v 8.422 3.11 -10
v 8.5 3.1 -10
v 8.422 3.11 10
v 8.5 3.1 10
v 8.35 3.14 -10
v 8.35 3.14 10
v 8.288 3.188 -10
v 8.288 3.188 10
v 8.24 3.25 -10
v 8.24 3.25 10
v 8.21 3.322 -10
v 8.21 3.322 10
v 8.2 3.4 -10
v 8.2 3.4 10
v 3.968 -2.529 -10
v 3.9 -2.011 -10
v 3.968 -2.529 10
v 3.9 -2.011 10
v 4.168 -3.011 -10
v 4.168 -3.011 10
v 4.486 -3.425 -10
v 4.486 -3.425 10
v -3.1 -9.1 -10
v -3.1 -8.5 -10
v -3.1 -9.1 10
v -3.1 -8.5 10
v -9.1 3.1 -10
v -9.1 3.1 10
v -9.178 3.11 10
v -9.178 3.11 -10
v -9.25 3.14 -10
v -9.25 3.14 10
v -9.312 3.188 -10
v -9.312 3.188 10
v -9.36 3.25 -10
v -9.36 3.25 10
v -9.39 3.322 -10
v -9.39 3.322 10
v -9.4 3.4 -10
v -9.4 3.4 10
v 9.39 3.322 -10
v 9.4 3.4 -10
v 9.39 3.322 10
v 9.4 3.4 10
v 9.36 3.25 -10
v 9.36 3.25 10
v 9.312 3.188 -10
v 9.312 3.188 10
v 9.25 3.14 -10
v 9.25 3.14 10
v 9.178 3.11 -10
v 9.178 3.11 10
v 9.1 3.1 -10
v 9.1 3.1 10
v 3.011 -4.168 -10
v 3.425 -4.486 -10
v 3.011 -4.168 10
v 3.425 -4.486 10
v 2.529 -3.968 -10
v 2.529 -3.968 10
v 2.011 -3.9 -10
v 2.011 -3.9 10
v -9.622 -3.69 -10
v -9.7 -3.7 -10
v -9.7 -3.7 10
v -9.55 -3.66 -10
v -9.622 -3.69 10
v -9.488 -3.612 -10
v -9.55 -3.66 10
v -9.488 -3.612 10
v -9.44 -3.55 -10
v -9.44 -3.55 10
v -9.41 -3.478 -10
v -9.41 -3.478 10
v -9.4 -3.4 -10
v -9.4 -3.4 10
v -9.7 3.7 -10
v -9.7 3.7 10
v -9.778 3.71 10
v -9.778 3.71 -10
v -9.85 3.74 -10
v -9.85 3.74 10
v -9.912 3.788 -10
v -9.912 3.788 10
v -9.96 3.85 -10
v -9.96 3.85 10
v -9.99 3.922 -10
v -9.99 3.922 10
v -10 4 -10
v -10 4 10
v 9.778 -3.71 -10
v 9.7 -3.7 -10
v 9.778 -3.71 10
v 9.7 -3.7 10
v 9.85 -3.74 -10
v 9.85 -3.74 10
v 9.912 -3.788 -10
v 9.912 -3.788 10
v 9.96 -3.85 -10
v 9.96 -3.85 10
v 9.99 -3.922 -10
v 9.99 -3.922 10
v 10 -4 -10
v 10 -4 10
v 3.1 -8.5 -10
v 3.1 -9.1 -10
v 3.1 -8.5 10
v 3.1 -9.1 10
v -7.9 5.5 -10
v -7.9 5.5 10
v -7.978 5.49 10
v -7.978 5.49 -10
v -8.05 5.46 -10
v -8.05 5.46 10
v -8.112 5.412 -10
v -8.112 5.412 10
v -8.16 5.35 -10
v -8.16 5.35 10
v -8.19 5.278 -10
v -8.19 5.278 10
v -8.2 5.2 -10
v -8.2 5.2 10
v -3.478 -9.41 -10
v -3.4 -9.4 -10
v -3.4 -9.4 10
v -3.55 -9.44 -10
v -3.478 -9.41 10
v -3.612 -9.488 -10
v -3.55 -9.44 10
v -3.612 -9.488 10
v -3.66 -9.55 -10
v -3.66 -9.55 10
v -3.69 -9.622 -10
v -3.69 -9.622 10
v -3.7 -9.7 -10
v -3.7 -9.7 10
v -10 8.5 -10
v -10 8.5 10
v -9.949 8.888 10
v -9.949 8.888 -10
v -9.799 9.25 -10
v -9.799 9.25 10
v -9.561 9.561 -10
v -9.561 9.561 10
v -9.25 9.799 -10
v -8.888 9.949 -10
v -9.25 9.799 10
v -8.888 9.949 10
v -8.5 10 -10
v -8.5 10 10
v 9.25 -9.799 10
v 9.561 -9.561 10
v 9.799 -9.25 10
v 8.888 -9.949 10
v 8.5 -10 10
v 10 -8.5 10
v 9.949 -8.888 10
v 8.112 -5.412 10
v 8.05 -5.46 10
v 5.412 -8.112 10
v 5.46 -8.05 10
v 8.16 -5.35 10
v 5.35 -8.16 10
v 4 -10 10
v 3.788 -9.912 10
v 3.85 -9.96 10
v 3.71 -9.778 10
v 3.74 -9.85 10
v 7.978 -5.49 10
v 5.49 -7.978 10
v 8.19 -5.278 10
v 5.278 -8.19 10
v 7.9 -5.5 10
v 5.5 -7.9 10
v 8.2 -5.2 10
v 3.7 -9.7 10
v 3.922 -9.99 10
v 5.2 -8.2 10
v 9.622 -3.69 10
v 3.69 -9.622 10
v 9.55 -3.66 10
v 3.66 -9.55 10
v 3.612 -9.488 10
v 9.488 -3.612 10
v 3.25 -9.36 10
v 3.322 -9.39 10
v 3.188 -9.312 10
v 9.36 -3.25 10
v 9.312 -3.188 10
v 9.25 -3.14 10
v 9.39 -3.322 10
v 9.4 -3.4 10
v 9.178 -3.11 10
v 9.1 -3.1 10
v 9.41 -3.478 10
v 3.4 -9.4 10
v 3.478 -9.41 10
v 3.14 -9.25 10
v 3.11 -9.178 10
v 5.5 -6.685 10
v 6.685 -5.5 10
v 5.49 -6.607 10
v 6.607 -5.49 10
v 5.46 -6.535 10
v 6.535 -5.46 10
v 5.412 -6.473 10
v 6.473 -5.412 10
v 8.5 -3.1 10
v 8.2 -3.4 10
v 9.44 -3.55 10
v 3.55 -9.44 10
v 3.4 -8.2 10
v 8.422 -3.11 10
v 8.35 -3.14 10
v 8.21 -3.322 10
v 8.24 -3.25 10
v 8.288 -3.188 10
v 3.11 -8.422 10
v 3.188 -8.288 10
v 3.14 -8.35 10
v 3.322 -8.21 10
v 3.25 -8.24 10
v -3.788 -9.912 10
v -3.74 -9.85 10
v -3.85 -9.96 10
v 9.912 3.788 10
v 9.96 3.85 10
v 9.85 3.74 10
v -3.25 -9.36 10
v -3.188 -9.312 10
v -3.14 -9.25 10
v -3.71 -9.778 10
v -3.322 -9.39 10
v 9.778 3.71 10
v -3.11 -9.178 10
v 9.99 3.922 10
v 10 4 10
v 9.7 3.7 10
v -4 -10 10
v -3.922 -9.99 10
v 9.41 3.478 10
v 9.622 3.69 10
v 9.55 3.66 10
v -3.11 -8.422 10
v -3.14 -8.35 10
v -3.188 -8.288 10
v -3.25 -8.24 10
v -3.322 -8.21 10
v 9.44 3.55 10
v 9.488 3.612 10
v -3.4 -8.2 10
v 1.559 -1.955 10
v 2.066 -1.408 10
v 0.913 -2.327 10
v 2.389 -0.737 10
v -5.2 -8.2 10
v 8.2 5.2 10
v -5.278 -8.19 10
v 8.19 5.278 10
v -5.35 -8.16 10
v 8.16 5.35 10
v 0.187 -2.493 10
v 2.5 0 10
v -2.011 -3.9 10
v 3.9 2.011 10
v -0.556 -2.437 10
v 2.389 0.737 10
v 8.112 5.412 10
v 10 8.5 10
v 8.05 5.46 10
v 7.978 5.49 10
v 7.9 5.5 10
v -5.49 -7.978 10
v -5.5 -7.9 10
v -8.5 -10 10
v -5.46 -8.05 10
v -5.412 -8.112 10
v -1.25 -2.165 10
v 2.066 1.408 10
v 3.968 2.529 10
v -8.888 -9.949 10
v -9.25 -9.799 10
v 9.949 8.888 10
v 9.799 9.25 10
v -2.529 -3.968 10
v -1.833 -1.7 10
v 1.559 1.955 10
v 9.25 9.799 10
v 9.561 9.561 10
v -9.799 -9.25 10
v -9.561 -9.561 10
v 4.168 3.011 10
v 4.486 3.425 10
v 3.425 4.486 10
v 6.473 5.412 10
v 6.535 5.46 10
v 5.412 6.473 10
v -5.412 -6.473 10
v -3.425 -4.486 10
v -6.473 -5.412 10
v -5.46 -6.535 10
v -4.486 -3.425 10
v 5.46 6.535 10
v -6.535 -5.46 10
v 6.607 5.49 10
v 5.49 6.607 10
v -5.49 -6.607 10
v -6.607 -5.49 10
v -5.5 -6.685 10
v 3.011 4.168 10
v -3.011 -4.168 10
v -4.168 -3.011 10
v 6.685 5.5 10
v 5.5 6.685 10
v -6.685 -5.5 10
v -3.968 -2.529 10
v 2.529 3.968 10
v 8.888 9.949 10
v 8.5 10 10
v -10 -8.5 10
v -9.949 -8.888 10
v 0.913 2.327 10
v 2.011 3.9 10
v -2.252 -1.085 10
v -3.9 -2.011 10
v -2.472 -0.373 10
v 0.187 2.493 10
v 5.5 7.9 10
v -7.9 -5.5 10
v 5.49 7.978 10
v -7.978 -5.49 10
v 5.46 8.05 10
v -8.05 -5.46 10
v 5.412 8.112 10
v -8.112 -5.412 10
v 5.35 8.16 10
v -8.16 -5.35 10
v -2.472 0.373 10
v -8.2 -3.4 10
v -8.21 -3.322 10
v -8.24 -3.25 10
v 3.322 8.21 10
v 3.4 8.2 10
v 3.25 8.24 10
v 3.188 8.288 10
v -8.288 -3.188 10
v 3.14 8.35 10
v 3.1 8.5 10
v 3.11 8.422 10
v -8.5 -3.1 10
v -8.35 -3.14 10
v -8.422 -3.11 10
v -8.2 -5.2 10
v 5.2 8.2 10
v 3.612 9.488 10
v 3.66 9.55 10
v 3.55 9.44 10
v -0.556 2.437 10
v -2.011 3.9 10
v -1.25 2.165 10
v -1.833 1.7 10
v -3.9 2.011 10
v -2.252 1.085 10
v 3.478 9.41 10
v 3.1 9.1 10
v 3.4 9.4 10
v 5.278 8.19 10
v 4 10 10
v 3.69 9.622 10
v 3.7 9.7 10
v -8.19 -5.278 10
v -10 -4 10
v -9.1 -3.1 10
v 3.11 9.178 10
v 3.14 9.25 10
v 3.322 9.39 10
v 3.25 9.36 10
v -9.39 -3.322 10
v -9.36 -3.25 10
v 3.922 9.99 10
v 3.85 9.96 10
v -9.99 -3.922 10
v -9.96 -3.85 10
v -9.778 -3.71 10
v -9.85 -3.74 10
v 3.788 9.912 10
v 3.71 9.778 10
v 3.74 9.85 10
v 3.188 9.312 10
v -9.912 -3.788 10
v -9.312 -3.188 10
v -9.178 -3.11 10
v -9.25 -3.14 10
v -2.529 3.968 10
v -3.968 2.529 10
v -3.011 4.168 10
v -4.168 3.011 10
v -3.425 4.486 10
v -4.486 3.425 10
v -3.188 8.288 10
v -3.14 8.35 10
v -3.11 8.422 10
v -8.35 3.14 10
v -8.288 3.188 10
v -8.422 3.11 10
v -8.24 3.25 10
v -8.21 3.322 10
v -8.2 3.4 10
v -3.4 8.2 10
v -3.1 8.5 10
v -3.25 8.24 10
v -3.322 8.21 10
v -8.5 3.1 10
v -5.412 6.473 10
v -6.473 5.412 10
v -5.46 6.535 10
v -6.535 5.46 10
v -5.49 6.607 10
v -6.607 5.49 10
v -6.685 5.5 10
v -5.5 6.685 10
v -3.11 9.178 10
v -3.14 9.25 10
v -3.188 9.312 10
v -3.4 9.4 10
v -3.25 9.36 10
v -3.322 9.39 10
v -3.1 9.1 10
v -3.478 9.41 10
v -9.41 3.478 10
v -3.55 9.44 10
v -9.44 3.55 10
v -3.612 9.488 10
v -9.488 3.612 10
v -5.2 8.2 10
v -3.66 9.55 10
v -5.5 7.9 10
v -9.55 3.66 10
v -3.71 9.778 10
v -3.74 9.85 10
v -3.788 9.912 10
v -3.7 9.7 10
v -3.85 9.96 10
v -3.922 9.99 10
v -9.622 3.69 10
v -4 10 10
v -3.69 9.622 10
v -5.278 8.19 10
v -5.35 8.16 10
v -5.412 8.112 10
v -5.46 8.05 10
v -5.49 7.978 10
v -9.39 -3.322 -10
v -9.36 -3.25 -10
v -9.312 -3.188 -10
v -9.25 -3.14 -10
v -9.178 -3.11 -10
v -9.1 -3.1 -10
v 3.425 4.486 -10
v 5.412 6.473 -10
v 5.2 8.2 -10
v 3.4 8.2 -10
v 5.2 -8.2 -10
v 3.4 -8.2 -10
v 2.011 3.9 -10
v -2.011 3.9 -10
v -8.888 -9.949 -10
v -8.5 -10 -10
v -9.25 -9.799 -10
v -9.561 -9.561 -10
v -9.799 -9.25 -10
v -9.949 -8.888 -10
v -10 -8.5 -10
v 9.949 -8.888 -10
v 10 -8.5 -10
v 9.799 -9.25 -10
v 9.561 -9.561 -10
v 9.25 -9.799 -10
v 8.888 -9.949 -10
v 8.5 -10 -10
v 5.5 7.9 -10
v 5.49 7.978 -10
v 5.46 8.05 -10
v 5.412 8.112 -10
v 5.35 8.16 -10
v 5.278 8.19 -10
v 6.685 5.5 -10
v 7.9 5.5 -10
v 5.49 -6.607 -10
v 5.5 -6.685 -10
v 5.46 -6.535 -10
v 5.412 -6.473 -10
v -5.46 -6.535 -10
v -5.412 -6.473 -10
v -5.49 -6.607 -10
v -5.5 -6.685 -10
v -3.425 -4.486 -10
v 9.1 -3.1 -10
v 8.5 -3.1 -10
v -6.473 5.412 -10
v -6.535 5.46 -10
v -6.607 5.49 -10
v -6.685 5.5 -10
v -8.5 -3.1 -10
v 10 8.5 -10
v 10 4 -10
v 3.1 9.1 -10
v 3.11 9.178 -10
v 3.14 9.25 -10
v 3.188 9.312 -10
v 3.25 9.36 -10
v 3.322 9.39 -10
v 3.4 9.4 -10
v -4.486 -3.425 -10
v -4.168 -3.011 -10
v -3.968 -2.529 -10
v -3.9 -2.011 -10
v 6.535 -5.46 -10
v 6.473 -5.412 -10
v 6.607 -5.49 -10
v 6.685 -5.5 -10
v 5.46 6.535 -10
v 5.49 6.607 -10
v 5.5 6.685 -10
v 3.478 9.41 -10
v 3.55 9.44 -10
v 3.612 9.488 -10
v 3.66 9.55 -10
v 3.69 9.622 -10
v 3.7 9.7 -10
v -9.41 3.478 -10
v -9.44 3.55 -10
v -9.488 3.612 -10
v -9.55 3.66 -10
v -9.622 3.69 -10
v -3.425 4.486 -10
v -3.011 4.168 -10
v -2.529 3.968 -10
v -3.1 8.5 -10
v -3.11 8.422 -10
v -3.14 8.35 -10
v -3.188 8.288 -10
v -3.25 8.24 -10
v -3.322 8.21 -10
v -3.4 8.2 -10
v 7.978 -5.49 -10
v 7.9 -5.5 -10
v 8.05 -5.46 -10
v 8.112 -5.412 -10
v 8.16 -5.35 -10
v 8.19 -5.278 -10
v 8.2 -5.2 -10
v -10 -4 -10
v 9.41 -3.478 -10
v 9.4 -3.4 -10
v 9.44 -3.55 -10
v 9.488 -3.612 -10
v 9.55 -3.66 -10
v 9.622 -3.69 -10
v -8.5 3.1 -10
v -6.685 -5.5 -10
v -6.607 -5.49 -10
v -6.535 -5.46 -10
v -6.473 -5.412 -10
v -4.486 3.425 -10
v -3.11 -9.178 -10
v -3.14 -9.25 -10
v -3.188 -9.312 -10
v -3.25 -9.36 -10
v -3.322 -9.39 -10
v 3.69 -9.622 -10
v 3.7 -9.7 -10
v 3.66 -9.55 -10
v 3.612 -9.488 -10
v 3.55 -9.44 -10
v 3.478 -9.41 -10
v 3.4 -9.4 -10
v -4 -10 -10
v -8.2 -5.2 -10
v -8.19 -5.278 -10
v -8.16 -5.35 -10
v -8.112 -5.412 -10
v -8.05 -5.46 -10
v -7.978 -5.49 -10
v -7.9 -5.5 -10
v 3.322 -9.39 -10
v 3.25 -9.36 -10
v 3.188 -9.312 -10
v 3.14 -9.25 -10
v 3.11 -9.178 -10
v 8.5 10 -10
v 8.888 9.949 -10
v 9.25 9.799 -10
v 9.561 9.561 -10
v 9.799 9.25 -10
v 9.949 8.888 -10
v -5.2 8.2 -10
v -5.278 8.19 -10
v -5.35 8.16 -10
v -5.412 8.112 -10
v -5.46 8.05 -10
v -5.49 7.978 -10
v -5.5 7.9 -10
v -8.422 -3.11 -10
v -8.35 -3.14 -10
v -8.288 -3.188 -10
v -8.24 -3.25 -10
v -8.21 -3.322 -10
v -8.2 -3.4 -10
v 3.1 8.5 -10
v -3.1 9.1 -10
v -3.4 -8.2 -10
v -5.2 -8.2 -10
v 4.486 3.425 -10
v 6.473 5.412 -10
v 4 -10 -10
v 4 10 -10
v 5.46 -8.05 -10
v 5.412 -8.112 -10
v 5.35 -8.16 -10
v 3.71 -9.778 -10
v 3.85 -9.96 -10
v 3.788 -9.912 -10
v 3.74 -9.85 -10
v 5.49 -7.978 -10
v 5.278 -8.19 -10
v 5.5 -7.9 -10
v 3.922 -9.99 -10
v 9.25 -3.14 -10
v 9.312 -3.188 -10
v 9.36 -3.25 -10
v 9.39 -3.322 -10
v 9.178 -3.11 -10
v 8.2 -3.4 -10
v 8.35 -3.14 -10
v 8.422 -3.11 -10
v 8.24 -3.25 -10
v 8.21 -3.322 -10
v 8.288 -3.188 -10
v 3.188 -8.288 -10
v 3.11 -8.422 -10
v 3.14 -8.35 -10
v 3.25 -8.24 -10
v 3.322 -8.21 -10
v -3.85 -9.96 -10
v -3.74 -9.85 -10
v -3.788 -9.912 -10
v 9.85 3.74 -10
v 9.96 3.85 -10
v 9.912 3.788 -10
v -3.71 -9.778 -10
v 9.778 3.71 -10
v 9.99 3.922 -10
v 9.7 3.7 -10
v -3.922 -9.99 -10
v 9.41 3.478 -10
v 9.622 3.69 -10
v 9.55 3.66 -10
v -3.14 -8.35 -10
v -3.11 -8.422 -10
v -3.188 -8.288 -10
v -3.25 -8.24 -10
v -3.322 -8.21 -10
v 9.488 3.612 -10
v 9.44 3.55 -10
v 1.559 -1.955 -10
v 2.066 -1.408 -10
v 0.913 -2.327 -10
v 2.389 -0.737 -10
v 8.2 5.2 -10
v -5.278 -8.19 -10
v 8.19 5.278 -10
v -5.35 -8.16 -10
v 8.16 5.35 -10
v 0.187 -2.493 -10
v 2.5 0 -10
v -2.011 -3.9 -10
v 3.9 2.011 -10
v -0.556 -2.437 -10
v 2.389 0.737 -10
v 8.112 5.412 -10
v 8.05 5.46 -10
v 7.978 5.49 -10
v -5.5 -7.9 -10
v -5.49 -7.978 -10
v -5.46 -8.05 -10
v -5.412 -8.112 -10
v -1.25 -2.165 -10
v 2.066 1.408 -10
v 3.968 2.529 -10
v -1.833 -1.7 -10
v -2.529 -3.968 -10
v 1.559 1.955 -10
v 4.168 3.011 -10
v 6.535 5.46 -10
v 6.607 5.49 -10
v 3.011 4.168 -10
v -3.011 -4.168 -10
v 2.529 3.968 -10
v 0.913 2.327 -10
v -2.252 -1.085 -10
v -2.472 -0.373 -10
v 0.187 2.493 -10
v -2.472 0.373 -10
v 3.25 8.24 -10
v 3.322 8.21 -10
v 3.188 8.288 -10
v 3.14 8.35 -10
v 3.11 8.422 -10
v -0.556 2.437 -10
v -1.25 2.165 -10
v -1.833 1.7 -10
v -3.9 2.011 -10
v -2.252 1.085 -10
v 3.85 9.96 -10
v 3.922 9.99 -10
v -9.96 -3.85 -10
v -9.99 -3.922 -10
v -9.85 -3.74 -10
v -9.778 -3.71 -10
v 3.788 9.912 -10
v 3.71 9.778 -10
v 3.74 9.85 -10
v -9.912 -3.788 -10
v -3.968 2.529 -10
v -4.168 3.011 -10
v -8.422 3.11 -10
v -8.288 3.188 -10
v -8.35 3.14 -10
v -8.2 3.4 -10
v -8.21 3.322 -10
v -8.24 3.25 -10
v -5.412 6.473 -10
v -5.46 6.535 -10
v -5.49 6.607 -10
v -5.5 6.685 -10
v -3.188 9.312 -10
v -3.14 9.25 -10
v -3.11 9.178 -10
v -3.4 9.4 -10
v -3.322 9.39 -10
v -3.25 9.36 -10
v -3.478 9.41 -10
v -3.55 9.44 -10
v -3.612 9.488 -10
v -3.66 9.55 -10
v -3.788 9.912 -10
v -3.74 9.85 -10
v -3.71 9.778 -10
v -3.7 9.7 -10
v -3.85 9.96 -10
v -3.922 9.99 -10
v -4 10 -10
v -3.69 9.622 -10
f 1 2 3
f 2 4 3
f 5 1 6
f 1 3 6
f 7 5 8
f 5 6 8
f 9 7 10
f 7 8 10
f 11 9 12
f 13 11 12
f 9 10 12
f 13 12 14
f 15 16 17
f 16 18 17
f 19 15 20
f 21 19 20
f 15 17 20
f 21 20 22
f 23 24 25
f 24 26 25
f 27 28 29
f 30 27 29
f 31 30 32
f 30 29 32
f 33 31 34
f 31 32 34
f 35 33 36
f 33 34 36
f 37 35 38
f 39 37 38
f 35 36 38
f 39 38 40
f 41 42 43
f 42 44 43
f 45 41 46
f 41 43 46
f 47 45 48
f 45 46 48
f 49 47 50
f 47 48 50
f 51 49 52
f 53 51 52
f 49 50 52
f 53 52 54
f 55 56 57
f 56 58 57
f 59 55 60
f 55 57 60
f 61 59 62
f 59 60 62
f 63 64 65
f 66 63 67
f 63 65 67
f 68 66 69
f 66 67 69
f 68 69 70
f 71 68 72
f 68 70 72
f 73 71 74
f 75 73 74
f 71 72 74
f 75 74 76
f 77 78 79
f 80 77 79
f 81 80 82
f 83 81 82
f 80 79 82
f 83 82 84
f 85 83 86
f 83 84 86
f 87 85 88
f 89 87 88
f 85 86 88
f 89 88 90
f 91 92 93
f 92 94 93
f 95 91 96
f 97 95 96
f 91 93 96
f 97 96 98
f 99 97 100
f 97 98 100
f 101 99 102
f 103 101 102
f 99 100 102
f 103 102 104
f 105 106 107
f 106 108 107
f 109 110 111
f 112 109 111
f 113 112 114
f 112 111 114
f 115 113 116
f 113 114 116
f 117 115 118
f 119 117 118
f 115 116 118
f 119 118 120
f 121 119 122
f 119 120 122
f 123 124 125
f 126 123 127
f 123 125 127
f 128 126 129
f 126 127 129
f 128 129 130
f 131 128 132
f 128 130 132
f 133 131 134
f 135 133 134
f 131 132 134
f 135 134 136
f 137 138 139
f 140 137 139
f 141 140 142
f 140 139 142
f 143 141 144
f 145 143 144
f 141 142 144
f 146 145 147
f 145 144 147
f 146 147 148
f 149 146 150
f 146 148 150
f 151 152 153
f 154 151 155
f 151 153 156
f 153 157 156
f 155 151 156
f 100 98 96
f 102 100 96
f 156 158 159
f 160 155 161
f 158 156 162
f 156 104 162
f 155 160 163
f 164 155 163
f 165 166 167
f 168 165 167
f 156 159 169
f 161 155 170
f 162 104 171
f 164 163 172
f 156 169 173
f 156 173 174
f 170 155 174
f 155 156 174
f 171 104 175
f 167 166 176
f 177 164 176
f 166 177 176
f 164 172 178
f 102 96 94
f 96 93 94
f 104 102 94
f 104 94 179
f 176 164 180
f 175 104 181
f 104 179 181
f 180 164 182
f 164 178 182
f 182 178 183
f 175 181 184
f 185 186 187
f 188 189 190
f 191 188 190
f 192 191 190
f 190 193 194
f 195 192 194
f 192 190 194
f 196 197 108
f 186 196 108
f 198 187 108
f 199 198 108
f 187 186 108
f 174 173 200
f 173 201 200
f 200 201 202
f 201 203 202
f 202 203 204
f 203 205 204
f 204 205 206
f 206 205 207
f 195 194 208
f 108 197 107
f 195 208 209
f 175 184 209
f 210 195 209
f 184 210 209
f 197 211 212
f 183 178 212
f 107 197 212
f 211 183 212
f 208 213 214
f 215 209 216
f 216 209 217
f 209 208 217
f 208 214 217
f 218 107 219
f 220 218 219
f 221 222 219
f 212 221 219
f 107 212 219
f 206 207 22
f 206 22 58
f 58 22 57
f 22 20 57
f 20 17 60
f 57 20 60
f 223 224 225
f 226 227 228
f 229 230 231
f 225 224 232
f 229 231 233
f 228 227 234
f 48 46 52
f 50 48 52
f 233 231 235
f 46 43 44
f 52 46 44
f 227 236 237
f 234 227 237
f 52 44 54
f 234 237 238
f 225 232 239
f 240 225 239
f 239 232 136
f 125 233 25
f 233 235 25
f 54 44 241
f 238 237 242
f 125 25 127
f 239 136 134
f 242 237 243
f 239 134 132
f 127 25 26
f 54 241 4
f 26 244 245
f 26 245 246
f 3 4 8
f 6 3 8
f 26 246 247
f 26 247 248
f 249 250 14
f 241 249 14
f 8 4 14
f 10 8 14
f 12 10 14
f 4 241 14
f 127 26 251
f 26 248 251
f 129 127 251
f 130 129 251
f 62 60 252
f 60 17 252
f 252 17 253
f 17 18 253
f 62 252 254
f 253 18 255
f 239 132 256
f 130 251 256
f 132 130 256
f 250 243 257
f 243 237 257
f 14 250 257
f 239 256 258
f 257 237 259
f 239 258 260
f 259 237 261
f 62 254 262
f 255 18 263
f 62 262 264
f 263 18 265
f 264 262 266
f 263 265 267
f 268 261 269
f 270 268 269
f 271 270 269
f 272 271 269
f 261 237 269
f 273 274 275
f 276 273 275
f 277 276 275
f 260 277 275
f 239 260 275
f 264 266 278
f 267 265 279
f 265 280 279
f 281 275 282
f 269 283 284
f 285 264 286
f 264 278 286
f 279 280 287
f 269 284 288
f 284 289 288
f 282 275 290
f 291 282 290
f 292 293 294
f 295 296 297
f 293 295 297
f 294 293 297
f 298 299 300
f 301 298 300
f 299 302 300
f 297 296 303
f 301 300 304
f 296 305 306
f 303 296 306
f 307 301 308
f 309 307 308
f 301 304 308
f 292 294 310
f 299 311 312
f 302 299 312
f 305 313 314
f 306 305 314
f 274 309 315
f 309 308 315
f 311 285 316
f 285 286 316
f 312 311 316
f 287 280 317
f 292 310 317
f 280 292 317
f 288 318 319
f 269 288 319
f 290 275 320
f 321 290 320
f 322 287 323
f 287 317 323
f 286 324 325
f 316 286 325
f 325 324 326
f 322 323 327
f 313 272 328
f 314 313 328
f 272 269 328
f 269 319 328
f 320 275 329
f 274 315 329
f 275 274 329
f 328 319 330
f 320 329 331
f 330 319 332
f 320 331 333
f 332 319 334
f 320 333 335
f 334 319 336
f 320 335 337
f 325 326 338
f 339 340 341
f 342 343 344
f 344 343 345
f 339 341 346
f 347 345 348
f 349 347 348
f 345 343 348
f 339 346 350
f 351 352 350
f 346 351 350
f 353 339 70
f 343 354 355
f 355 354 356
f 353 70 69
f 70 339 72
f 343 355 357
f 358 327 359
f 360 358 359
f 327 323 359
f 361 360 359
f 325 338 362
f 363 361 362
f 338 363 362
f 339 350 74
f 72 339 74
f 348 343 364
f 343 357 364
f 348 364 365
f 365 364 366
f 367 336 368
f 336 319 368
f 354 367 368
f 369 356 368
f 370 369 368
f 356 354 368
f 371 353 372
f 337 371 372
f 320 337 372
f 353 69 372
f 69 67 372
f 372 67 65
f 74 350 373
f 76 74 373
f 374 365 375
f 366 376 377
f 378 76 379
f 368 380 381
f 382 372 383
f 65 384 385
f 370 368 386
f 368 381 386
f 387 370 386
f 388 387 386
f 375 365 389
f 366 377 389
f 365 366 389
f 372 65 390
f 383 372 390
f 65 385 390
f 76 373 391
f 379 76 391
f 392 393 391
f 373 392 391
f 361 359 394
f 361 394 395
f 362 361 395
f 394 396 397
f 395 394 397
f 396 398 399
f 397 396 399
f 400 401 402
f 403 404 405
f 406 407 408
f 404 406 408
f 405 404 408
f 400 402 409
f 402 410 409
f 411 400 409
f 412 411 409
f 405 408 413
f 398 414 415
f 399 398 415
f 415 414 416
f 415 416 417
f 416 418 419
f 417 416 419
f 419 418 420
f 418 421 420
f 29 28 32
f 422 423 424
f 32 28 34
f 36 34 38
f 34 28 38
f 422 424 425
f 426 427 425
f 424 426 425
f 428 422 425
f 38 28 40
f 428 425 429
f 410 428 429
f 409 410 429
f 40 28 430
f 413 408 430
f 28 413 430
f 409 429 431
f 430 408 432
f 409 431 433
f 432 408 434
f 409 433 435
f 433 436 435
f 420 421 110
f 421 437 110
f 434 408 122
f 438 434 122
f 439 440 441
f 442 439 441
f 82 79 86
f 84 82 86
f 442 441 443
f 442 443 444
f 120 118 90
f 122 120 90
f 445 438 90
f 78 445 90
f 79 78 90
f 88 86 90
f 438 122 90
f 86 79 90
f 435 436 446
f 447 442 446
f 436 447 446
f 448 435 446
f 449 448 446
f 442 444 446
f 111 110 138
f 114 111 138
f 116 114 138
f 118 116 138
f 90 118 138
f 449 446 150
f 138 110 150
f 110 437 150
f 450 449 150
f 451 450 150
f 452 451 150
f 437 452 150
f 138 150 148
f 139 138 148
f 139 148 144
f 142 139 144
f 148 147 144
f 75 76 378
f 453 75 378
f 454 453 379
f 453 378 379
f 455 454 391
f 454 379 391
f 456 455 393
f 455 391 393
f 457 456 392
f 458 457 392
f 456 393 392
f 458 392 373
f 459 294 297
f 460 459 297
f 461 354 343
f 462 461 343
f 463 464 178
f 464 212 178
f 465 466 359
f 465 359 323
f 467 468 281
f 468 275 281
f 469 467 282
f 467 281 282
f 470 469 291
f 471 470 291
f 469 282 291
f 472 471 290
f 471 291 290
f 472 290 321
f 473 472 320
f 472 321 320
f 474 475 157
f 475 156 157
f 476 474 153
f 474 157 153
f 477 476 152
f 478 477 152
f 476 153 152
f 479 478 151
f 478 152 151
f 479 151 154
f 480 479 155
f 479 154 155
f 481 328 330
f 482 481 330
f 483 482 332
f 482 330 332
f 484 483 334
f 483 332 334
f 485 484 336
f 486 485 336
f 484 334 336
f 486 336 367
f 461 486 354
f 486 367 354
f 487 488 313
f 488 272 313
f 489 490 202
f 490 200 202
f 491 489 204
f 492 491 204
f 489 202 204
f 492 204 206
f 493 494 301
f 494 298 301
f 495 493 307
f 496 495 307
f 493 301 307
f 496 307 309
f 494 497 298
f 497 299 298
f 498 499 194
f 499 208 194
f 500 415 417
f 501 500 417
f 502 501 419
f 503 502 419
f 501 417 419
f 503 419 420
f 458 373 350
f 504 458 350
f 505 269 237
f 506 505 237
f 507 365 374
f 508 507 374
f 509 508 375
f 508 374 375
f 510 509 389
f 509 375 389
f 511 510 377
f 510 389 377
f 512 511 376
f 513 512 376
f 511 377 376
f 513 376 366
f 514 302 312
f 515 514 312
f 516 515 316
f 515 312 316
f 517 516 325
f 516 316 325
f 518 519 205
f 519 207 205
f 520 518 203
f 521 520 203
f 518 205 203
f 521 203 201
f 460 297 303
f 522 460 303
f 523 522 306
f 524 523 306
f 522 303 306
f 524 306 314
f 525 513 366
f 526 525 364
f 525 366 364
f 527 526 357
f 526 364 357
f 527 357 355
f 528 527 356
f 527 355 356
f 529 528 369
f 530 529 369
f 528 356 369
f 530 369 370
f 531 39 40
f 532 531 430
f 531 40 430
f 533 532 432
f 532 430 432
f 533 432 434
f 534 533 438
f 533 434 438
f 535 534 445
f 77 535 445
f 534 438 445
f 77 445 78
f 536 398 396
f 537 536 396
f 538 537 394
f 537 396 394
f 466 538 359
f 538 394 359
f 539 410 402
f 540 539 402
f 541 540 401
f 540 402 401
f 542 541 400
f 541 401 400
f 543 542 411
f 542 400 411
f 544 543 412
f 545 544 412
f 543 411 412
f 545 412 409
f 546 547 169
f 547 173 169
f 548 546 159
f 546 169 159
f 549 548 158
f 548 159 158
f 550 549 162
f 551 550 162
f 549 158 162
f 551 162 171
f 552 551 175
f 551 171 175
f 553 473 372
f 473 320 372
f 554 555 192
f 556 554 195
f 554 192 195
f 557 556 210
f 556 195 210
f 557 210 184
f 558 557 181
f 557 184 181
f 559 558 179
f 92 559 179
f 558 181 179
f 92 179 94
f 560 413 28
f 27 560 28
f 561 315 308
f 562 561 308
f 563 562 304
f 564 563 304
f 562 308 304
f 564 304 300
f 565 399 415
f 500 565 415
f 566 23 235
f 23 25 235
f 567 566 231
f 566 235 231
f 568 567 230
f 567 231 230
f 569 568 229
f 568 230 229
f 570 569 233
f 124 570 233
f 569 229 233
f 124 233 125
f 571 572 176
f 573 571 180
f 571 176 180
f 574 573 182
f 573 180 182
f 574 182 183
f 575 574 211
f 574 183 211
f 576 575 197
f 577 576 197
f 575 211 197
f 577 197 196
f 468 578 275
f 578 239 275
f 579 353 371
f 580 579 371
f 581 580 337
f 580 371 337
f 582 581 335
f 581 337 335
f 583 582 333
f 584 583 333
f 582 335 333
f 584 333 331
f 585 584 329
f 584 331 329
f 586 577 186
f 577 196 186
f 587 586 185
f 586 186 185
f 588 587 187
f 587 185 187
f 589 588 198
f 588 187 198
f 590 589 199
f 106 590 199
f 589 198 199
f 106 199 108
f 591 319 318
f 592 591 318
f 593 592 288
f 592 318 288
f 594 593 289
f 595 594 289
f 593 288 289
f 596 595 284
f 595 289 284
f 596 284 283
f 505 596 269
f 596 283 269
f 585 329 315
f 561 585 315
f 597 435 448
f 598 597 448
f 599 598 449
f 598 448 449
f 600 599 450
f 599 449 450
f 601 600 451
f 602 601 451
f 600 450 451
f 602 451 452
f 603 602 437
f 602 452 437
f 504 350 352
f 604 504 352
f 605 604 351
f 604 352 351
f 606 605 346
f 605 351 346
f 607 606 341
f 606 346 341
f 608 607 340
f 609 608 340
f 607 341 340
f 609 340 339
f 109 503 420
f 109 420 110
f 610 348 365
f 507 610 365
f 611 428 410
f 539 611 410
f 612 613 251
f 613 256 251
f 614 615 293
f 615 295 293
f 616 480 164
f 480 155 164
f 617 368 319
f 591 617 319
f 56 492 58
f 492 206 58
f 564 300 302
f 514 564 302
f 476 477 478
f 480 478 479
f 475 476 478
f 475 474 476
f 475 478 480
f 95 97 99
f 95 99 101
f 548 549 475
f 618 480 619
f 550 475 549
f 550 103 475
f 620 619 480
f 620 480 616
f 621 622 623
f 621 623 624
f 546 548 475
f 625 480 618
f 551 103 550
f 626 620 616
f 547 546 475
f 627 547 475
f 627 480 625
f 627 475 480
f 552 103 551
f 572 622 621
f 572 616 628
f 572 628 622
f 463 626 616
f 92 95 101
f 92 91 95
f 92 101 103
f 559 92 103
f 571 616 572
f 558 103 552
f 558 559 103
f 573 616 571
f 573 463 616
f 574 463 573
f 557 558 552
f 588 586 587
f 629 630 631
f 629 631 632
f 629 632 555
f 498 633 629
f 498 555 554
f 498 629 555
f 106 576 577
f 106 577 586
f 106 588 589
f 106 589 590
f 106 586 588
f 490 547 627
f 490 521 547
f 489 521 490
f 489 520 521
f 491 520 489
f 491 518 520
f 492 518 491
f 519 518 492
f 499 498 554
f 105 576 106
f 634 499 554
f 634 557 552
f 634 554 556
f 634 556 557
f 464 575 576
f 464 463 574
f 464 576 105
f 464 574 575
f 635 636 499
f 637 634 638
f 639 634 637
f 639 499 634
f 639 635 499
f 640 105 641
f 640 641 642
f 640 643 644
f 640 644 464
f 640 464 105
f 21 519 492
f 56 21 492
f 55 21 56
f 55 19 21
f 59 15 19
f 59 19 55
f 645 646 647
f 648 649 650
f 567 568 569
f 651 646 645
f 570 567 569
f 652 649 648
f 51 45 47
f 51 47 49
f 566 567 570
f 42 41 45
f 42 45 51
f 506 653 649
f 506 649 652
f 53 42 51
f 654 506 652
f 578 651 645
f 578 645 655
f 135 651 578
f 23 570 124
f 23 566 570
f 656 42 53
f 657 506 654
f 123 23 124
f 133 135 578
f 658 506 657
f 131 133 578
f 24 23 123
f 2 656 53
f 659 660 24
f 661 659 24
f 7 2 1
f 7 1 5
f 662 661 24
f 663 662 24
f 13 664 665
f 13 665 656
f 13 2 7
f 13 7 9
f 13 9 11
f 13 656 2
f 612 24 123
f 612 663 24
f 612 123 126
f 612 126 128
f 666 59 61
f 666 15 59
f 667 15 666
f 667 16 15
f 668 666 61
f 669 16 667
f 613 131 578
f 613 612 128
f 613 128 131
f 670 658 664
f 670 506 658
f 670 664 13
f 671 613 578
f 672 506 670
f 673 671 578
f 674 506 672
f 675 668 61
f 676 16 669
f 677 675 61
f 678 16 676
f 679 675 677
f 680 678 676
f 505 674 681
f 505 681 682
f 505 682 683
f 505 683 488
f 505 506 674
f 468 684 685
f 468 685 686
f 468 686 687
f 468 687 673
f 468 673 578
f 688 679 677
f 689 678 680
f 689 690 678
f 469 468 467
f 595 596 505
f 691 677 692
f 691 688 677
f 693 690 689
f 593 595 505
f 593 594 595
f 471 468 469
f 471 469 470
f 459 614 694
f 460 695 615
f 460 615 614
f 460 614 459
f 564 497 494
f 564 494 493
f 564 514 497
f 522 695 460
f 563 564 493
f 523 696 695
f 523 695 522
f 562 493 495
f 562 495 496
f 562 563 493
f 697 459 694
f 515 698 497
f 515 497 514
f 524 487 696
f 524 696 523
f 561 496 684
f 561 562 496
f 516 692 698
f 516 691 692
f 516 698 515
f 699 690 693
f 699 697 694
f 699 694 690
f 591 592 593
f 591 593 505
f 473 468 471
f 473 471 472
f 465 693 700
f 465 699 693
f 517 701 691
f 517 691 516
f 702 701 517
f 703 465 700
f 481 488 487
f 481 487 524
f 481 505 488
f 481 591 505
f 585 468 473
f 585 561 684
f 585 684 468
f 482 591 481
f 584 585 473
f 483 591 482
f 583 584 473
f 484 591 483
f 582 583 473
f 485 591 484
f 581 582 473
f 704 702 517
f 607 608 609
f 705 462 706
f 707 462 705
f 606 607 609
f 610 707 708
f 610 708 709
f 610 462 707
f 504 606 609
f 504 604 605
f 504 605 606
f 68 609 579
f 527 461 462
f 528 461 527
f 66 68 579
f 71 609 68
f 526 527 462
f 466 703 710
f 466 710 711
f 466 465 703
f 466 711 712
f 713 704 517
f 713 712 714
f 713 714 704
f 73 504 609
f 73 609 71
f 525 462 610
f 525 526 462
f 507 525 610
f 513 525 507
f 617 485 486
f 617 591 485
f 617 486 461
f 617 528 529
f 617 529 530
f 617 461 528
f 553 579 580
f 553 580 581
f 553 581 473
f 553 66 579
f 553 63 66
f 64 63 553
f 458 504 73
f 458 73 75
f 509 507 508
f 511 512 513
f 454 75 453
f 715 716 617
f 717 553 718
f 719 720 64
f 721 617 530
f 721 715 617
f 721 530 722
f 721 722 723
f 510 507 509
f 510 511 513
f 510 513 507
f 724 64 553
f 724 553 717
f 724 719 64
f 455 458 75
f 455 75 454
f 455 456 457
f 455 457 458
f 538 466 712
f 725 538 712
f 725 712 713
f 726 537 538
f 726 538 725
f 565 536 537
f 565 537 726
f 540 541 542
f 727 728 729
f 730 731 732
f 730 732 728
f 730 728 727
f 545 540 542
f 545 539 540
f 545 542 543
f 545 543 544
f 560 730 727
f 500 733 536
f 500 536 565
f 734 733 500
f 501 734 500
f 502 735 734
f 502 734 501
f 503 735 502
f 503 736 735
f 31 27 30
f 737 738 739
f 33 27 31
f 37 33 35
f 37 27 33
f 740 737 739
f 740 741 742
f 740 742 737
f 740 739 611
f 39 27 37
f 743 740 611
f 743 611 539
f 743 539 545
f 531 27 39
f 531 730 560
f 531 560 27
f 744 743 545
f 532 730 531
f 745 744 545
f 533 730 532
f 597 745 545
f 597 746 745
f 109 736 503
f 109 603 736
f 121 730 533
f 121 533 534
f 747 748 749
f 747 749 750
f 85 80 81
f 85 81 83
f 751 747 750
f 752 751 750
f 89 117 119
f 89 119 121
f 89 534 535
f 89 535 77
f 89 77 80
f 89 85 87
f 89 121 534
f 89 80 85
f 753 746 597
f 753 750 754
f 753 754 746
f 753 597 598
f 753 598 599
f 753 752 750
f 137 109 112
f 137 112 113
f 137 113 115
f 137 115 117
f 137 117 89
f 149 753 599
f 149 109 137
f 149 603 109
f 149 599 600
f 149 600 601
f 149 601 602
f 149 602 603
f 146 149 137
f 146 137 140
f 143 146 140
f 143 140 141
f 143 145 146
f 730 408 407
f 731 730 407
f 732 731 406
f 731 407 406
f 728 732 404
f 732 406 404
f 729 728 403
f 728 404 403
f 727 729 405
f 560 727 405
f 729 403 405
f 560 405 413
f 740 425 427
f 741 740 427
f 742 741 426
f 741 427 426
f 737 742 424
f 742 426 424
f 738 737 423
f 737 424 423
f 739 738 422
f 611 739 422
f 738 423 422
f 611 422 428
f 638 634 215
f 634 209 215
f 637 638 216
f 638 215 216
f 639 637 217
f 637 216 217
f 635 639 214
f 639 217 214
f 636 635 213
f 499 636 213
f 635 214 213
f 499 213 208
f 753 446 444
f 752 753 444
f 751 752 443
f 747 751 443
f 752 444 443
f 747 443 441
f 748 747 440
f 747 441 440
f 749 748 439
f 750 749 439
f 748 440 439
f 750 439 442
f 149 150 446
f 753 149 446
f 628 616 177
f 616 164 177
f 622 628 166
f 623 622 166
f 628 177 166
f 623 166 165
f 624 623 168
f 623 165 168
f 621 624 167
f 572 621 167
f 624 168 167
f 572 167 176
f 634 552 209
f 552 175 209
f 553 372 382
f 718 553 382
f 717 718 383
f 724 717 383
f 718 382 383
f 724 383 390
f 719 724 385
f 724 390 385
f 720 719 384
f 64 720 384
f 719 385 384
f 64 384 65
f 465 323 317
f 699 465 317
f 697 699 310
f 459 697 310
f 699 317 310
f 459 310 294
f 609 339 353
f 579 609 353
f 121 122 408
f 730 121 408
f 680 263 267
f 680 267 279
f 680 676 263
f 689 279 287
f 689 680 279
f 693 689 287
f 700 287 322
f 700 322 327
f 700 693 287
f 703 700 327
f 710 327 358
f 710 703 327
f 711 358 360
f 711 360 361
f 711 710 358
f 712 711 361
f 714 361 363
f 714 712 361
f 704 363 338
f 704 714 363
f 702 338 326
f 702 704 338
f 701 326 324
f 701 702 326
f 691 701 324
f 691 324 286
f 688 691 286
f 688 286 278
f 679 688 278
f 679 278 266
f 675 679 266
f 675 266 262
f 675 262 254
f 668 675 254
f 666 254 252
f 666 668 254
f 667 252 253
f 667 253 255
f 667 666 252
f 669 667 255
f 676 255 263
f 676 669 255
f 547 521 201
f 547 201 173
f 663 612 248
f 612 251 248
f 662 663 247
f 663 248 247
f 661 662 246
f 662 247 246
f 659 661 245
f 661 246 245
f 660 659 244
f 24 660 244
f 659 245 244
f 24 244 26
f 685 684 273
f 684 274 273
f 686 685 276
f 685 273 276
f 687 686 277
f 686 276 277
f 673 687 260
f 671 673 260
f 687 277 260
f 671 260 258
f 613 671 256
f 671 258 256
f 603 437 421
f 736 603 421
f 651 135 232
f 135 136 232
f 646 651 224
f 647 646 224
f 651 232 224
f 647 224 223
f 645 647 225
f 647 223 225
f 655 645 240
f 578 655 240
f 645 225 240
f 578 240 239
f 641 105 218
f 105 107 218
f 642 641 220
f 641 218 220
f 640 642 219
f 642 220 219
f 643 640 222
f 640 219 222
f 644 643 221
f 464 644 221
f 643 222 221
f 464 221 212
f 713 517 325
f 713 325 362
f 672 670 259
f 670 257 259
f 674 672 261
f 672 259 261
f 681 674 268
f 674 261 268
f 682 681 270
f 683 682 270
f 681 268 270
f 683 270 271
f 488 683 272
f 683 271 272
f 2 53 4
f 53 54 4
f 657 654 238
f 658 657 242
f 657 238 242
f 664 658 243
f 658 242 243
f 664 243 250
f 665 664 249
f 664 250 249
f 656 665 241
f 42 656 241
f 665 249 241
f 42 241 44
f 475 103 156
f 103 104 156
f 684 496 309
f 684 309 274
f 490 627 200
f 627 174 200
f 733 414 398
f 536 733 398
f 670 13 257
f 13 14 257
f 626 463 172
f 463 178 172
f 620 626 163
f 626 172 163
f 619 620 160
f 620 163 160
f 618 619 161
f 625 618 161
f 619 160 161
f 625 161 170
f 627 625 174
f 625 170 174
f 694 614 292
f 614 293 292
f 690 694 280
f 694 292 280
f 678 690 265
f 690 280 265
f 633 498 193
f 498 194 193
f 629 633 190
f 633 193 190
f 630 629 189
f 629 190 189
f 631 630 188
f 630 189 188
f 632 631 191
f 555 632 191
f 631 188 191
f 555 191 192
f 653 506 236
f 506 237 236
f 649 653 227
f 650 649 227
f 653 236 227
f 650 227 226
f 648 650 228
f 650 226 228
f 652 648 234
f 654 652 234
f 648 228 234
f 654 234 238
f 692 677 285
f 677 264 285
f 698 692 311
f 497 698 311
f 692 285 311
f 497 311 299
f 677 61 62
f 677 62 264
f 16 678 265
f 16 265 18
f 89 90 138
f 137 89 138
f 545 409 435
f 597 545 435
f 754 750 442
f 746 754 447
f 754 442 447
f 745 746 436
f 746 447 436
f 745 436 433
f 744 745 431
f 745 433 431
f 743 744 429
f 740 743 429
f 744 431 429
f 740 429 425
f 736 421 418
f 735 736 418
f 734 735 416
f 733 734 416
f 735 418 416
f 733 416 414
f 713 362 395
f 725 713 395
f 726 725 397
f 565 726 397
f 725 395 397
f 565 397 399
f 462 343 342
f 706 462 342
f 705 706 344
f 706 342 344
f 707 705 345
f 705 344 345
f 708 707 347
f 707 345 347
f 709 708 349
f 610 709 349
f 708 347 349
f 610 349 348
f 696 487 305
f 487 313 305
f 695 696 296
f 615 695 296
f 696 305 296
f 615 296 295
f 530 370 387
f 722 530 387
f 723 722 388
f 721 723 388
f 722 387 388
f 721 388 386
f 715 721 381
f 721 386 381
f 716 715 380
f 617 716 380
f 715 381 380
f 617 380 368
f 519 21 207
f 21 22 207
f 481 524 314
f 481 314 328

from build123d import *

# Parameters (mm, degrees)
SKETCH_1_R      = 2.5
EXTRUDE_1_DEPTH = 10


with BuildPart() as part:
    # 草图1 → 凸台-拉伸1 (new, symmetric)
    with BuildSketch(Plane.XY):
        with BuildLine():
            Line((10, 8.5), (10, 4))
            ThreePointArc((10, 4), (9.912132034, 3.787867966), (9.7, 3.7))
            ThreePointArc((9.7, 3.7), (9.487867966, 3.612132034), (9.4, 3.4))
            ThreePointArc((9.4, 3.4), (9.312132034, 3.187867966), (9.1, 3.1))
            Line((9.1, 3.1), (8.5, 3.1))
            ThreePointArc((8.5, 3.1), (8.287867966, 3.187867966), (8.2, 3.4))
            Line((8.2, 3.4), (8.2, 5.2))
            ThreePointArc((8.2, 5.2), (8.112132034, 5.412132034), (7.9, 5.5))
            Line((7.9, 5.5), (6.68492424, 5.5))
            ThreePointArc((6.68492424, 5.5), (6.570119211, 5.47716386), (6.472792206, 5.412132034))
            Line((6.472792206, 5.412132034), (4.485786438, 3.425126266))
            ThreePointArc((4.485786438, 3.425126266), (4.052240935, 2.776279568), (3.9, 2.010912703))
            Line((3.9, 2.010912703), (3.9, -2.010912703))
            ThreePointArc((3.9, -2.010912703), (4.052240935, -2.776279568), (4.485786438, -3.425126266))
            Line((4.485786438, -3.425126266), (6.472792206, -5.412132034))
            ThreePointArc((6.472792206, -5.412132034), (6.570119211, -5.47716386), (6.68492424, -5.5))
            Line((6.68492424, -5.5), (7.9, -5.5))
            ThreePointArc((7.9, -5.5), (8.112132034, -5.412132034), (8.2, -5.2))
            Line((8.2, -5.2), (8.2, -3.4))
            ThreePointArc((8.2, -3.4), (8.287867966, -3.187867966), (8.5, -3.1))
            Line((8.5, -3.1), (9.1, -3.1))
            ThreePointArc((9.1, -3.1), (9.312132034, -3.187867966), (9.4, -3.4))
            ThreePointArc((9.4, -3.4), (9.487867966, -3.612132034), (9.7, -3.7))
            ThreePointArc((9.7, -3.7), (9.912132034, -3.787867966), (10, -4))
            Line((10, -4), (10, -8.5))
            ThreePointArc((10, -8.5), (9.560660172, -9.560660172), (8.5, -10))
            Line((8.5, -10), (4, -10))
            ThreePointArc((4, -10), (3.787867966, -9.912132034), (3.7, -9.7))
            ThreePointArc((3.7, -9.7), (3.612132034, -9.487867966), (3.4, -9.4))
            ThreePointArc((3.4, -9.4), (3.187867966, -9.312132034), (3.1, -9.1))
            Line((3.1, -9.1), (3.1, -8.5))
            ThreePointArc((3.1, -8.5), (3.187867966, -8.287867966), (3.4, -8.2))
            Line((3.4, -8.2), (5.2, -8.2))
            ThreePointArc((5.2, -8.2), (5.412132034, -8.112132034), (5.5, -7.9))
            Line((5.5, -7.9), (5.5, -6.68492424))
            ThreePointArc((5.5, -6.68492424), (5.47716386, -6.570119211), (5.412132034, -6.472792206))
            Line((5.412132034, -6.472792206), (3.425126266, -4.485786438))
            ThreePointArc((3.425126266, -4.485786438), (2.776279568, -4.052240935), (2.010912703, -3.9))
            Line((2.010912703, -3.9), (-2.010912703, -3.9))
            ThreePointArc((-2.010912703, -3.9), (-2.776279568, -4.052240935), (-3.425126266, -4.485786438))
            Line((-3.425126266, -4.485786438), (-5.412132034, -6.472792206))
            ThreePointArc((-5.412132034, -6.472792206), (-5.47716386, -6.570119211), (-5.5, -6.68492424))
            Line((-5.5, -6.68492424), (-5.5, -7.9))
            ThreePointArc((-5.5, -7.9), (-5.412132034, -8.112132034), (-5.2, -8.2))
            Line((-5.2, -8.2), (-3.4, -8.2))
            ThreePointArc((-3.4, -8.2), (-3.187867966, -8.287867966), (-3.1, -8.5))
            Line((-3.1, -8.5), (-3.1, -9.1))
            ThreePointArc((-3.1, -9.1), (-3.187867966, -9.312132034), (-3.4, -9.4))
            ThreePointArc((-3.4, -9.4), (-3.612132034, -9.487867966), (-3.7, -9.7))
            ThreePointArc((-3.7, -9.7), (-3.787867966, -9.912132034), (-4, -10))
            Line((-4, -10), (-8.5, -10))
            ThreePointArc((-8.5, -10), (-9.560660172, -9.560660172), (-10, -8.5))
            Line((-10, -8.5), (-10, -4))
            ThreePointArc((-10, -4), (-9.912132034, -3.787867966), (-9.7, -3.7))
            ThreePointArc((-9.7, -3.7), (-9.487867966, -3.612132034), (-9.4, -3.4))
            ThreePointArc((-9.4, -3.4), (-9.312132034, -3.187867966), (-9.1, -3.1))
            Line((-9.1, -3.1), (-8.5, -3.1))
            ThreePointArc((-8.5, -3.1), (-8.287867966, -3.187867966), (-8.2, -3.4))
            Line((-8.2, -3.4), (-8.2, -5.2))
            ThreePointArc((-8.2, -5.2), (-8.112132034, -5.412132034), (-7.9, -5.5))
            Line((-7.9, -5.5), (-6.68492424, -5.5))
            ThreePointArc((-6.68492424, -5.5), (-6.570119211, -5.47716386), (-6.472792206, -5.412132034))
            Line((-6.472792206, -5.412132034), (-4.485786438, -3.425126266))
            ThreePointArc((-4.485786438, -3.425126266), (-4.052240935, -2.776279568), (-3.9, -2.010912703))
            Line((-3.9, -2.010912703), (-3.9, 2.010912703))
            ThreePointArc((-3.9, 2.010912703), (-4.052240935, 2.776279568), (-4.485786438, 3.425126266))
            Line((-4.485786438, 3.425126266), (-6.472792206, 5.412132034))
            ThreePointArc((-6.472792206, 5.412132034), (-6.570119211, 5.47716386), (-6.68492424, 5.5))
            Line((-6.68492424, 5.5), (-7.9, 5.5))
            ThreePointArc((-7.9, 5.5), (-8.112132034, 5.412132034), (-8.2, 5.2))
            Line((-8.2, 5.2), (-8.2, 3.4))
            ThreePointArc((-8.2, 3.4), (-8.287867966, 3.187867966), (-8.5, 3.1))
            Line((-8.5, 3.1), (-9.1, 3.1))
            ThreePointArc((-9.1, 3.1), (-9.312132034, 3.187867966), (-9.4, 3.4))
            ThreePointArc((-9.4, 3.4), (-9.487867966, 3.612132034), (-9.7, 3.7))
            ThreePointArc((-9.7, 3.7), (-9.912132034, 3.787867966), (-10, 4))
            Line((-10, 4), (-10, 8.5))
            ThreePointArc((-10, 8.5), (-9.560660172, 9.560660172), (-8.5, 10))
            Line((-8.5, 10), (-4, 10))
            ThreePointArc((-4, 10), (-3.787867966, 9.912132034), (-3.7, 9.7))
            ThreePointArc((-3.7, 9.7), (-3.612132034, 9.487867966), (-3.4, 9.4))
            ThreePointArc((-3.4, 9.4), (-3.187867966, 9.312132034), (-3.1, 9.1))
            Line((-3.1, 9.1), (-3.1, 8.5))
            ThreePointArc((-3.1, 8.5), (-3.187867966, 8.287867966), (-3.4, 8.2))
            Line((-3.4, 8.2), (-5.2, 8.2))
            ThreePointArc((-5.2, 8.2), (-5.412132034, 8.112132034), (-5.5, 7.9))
            Line((-5.5, 7.9), (-5.5, 6.68492424))
            ThreePointArc((-5.5, 6.68492424), (-5.47716386, 6.570119211), (-5.412132034, 6.472792206))
            Line((-5.412132034, 6.472792206), (-3.425126266, 4.485786438))
            ThreePointArc((-3.425126266, 4.485786438), (-2.776279568, 4.052240935), (-2.010912703, 3.9))
            Line((-2.010912703, 3.9), (2.010912703, 3.9))
            ThreePointArc((2.010912703, 3.9), (2.776279568, 4.052240935), (3.425126266, 4.485786438))
            Line((3.425126266, 4.485786438), (5.412132034, 6.472792206))
            ThreePointArc((5.412132034, 6.472792206), (5.47716386, 6.570119211), (5.5, 6.68492424))
            Line((5.5, 6.68492424), (5.5, 7.9))
            ThreePointArc((5.5, 7.9), (5.412132034, 8.112132034), (5.2, 8.2))
            Line((5.2, 8.2), (3.4, 8.2))
            ThreePointArc((3.4, 8.2), (3.187867966, 8.287867966), (3.1, 8.5))
            Line((3.1, 8.5), (3.1, 9.1))
            ThreePointArc((3.1, 9.1), (3.187867966, 9.312132034), (3.4, 9.4))
            ThreePointArc((3.4, 9.4), (3.612132034, 9.487867966), (3.7, 9.7))
            ThreePointArc((3.7, 9.7), (3.787867966, 9.912132034), (4, 10))
            Line((4, 10), (8.5, 10))
            ThreePointArc((8.5, 10), (9.560660172, 9.560660172), (10, 8.5))
        make_face()
        Circle(SKETCH_1_R, mode=Mode.SUBTRACT)
    extrude(amount=EXTRUDE_1_DEPTH, both=True)


solid = part.part
